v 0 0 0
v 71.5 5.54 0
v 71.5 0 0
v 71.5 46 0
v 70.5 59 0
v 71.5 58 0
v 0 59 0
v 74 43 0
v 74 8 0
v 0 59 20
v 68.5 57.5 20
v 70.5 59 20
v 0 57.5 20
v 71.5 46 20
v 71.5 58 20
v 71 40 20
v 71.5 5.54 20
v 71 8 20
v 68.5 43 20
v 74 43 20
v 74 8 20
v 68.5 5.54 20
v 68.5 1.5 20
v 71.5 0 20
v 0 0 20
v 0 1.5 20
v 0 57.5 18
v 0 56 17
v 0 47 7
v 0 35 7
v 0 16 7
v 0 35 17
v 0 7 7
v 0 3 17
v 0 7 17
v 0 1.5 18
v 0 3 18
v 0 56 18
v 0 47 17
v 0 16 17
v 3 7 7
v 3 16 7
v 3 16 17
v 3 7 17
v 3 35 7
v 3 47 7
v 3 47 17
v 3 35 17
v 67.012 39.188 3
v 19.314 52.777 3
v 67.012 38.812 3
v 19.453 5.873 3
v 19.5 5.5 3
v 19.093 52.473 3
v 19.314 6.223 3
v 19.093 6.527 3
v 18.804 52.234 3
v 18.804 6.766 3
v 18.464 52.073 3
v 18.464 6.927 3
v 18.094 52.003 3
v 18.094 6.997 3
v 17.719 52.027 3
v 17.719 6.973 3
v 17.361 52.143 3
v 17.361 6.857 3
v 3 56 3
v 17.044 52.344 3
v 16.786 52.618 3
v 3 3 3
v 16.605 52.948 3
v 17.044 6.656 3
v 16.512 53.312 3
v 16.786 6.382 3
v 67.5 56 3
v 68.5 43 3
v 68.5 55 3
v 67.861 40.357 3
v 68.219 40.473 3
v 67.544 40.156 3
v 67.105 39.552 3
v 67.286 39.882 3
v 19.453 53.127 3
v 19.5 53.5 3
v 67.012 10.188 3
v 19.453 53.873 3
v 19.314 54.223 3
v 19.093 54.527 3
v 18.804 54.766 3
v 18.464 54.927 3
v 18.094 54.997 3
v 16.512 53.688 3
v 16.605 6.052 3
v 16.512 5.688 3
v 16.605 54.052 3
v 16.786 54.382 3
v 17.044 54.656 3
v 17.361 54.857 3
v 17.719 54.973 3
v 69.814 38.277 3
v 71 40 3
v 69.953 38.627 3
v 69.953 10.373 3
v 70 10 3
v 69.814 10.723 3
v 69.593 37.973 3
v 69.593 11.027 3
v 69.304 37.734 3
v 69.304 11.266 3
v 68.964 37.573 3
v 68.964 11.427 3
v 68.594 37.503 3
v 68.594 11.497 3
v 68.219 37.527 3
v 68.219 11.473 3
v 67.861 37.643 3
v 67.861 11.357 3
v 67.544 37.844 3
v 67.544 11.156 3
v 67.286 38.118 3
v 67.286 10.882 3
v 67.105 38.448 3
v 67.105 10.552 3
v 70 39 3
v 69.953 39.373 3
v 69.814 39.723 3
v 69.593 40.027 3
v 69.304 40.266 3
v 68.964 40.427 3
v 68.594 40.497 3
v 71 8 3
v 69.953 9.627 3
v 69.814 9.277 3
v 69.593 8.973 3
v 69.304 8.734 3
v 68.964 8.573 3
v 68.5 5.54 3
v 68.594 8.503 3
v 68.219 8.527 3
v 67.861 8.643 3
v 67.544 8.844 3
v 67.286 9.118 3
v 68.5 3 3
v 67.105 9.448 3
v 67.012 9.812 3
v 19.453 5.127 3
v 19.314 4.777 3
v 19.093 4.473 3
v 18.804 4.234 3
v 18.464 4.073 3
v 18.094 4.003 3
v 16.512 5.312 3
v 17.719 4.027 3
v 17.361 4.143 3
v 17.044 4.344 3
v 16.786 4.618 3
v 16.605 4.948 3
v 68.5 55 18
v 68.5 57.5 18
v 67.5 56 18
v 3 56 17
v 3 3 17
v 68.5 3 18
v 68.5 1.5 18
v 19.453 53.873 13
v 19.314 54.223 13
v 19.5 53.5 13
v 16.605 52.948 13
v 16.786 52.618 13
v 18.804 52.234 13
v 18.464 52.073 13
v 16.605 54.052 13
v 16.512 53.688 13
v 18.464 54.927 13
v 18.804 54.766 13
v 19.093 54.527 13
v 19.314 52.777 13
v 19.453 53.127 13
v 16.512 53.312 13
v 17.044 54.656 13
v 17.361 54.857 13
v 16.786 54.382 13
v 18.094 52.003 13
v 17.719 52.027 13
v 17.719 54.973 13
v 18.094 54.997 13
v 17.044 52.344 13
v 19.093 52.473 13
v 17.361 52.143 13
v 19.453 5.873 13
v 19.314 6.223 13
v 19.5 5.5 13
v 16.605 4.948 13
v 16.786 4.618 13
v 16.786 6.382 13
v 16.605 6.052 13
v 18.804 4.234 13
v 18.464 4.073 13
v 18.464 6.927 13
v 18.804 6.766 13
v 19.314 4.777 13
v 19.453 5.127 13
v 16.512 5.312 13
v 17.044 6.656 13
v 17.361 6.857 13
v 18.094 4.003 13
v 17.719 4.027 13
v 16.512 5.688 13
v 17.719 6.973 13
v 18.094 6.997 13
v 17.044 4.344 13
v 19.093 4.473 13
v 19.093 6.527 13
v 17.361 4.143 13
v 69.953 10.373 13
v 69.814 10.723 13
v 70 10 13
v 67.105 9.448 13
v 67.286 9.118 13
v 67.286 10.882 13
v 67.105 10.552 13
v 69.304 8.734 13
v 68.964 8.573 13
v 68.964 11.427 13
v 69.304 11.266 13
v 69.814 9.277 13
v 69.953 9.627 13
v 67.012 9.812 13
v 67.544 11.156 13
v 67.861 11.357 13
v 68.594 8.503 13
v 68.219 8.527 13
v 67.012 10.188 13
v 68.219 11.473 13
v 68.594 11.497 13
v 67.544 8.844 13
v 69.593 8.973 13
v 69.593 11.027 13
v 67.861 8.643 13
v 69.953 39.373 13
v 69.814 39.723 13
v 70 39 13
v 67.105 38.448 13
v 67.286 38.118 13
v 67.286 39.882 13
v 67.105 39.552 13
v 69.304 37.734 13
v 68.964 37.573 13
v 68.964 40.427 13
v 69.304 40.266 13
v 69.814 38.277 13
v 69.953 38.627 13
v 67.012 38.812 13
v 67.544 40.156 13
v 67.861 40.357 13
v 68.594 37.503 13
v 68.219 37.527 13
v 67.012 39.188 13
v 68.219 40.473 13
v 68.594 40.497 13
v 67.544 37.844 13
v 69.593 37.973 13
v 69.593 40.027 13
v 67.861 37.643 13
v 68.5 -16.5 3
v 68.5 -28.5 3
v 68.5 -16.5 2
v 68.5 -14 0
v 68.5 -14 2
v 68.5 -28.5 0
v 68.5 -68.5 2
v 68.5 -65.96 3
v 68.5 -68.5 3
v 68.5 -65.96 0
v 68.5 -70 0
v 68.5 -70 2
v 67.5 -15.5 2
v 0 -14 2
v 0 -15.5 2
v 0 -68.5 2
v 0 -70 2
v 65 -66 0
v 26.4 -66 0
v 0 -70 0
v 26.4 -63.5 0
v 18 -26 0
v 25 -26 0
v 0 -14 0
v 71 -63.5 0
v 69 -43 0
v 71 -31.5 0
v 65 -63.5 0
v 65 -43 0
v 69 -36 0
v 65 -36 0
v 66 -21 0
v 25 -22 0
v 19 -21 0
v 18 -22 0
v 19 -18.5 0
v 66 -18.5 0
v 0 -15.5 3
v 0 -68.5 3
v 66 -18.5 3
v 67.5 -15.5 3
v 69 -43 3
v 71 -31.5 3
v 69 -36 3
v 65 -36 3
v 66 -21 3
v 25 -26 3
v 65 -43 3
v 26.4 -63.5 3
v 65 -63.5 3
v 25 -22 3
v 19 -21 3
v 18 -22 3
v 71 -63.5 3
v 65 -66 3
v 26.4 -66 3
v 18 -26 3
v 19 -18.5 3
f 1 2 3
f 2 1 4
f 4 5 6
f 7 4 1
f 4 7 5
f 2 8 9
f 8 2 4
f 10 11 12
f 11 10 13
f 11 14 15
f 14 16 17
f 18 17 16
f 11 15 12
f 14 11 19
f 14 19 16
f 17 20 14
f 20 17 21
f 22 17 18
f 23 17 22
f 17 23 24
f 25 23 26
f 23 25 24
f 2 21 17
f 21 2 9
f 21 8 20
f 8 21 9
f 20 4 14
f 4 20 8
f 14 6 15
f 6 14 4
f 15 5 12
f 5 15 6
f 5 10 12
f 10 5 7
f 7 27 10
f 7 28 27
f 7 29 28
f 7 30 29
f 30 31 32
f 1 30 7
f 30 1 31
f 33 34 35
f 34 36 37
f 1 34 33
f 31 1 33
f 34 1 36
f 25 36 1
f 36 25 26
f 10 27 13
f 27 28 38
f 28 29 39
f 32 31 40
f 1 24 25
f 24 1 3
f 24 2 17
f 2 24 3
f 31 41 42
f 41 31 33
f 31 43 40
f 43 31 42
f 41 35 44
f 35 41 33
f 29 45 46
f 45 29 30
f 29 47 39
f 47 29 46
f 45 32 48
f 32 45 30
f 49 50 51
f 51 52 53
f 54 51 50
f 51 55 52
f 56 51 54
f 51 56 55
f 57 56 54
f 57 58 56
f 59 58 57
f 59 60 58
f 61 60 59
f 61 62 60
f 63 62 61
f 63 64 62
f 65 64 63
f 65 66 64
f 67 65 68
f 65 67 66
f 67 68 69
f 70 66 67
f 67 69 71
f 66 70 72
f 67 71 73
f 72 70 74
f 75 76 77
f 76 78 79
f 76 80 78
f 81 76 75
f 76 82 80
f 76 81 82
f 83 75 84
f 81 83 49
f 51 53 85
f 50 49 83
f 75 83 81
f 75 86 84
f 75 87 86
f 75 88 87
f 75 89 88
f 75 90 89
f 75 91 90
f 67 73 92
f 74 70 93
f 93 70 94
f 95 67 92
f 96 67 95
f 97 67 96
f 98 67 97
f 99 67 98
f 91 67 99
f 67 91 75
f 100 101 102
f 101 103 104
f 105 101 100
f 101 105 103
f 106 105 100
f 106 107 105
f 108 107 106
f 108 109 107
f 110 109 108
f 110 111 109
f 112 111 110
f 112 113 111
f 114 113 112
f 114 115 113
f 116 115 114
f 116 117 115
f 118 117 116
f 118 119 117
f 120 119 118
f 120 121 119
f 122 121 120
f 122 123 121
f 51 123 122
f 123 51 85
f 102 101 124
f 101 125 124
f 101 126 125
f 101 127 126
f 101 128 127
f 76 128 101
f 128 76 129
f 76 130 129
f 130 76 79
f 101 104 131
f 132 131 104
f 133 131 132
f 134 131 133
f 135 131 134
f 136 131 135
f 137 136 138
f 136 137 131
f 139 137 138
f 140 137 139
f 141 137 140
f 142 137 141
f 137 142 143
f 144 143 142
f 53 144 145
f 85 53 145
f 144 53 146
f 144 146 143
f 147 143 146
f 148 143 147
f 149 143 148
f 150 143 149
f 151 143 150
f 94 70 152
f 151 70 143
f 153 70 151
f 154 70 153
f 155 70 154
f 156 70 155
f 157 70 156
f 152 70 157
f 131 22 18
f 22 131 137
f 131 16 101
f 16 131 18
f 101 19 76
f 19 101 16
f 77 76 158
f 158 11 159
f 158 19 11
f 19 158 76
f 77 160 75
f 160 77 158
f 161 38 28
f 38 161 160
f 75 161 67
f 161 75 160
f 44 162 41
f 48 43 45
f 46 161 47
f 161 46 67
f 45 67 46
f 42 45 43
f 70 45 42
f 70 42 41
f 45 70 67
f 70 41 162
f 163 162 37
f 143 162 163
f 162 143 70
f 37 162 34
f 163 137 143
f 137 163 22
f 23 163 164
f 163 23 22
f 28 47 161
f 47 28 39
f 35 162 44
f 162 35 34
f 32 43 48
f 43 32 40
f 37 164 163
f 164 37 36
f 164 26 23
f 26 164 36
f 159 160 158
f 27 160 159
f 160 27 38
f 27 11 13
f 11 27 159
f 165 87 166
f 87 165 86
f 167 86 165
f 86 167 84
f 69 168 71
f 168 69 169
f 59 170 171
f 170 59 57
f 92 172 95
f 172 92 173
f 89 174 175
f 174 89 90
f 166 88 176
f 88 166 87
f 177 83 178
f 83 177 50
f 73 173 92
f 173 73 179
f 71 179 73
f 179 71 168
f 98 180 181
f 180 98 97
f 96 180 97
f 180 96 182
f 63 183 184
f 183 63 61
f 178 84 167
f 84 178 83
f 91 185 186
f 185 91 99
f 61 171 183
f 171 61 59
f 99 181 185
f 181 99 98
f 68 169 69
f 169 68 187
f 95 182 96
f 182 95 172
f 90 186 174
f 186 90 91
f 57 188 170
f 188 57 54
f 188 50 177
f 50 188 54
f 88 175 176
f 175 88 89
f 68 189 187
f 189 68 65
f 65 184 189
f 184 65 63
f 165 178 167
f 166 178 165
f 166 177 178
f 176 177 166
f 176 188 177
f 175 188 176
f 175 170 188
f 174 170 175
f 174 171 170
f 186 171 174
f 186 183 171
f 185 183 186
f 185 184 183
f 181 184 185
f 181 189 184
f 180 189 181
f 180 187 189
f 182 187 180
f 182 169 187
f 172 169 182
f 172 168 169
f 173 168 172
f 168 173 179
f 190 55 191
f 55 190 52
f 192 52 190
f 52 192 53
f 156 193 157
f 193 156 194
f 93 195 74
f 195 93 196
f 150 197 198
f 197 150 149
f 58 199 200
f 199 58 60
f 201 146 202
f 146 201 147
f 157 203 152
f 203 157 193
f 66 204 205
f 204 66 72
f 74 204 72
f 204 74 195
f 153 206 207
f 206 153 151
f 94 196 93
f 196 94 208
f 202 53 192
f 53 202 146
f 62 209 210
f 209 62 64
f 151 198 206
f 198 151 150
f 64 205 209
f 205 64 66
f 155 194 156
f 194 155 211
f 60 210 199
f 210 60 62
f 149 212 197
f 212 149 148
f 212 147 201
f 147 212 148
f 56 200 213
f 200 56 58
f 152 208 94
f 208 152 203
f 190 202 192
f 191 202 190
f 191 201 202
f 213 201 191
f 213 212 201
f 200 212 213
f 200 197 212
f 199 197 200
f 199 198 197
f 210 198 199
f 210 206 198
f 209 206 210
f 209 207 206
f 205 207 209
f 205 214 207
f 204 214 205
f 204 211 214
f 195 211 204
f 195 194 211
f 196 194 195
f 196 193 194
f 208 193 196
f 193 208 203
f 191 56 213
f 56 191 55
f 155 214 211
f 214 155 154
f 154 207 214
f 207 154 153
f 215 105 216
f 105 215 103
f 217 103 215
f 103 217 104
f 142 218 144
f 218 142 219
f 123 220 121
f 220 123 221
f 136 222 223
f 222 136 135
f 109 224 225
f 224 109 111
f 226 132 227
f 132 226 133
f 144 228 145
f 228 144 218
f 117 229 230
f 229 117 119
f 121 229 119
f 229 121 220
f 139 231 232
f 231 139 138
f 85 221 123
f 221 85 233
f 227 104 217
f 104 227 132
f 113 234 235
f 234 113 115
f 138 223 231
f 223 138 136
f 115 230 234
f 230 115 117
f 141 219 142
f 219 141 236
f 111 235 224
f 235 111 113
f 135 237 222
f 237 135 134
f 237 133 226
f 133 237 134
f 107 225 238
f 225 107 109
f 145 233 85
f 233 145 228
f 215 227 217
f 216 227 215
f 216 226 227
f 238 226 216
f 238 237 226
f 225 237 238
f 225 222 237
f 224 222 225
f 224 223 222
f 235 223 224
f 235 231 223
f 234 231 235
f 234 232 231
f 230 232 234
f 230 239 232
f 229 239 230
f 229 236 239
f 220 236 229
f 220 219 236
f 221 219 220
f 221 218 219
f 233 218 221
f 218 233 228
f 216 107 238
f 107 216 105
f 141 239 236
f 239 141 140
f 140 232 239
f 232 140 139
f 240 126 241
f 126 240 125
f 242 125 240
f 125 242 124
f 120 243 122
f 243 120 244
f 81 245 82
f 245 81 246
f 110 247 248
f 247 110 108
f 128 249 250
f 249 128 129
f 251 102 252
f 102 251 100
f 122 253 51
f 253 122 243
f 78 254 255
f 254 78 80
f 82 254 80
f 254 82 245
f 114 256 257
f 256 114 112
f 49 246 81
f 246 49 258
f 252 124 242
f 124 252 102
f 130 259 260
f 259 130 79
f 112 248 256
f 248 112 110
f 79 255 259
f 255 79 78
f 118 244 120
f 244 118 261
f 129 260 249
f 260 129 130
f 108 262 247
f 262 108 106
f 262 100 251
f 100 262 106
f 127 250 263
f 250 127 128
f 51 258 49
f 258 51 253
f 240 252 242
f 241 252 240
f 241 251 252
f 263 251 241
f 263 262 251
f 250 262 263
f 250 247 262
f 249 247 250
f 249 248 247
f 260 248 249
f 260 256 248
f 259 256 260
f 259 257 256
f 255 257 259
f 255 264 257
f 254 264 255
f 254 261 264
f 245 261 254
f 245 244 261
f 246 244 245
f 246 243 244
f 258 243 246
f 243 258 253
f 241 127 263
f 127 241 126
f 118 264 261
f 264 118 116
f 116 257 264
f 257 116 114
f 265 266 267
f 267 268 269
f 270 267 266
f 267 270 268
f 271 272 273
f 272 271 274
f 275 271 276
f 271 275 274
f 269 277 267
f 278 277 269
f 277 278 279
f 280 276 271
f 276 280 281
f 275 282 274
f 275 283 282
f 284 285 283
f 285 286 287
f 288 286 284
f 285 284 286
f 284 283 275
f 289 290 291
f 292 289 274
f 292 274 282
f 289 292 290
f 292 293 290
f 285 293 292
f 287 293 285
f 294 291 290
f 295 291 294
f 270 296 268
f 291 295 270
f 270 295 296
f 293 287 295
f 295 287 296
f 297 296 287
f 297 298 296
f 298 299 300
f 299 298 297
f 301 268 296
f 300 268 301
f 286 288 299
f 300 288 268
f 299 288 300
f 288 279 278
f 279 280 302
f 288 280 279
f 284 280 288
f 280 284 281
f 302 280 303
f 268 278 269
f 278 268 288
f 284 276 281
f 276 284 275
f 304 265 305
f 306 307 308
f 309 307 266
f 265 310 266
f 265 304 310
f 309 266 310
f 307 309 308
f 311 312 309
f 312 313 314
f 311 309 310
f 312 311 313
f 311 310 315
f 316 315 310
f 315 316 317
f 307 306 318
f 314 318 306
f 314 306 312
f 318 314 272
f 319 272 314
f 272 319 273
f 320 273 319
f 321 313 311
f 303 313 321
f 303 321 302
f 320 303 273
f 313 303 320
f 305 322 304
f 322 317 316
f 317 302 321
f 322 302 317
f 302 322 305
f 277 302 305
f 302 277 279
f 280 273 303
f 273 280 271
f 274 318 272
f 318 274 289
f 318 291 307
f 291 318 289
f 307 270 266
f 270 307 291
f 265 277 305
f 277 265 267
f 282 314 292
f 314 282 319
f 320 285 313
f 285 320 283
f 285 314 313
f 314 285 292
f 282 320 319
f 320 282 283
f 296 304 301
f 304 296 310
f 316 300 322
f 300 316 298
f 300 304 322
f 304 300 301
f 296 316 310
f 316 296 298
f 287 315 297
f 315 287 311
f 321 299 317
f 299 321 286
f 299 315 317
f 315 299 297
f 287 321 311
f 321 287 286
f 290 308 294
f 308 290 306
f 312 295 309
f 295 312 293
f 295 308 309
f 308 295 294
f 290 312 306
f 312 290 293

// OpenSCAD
//This is the base case for arduino uno

board_width = 53;
board_thick = 4;
box_thick = 3;
// I create a 2D polygon using array points with exact same shape as the Arduino Uno Board, then use linear_extrude() function to make it 3D
module Box(box_height,box_thick)
{
	linear_extrude(height = box_height, convexity = 10, twist = 0)
	{
		polygon( points = [ [0, board_width+box_thick*2],
						[64.5+box_thick*2, board_width+box_thick*2],
						[65.5+box_thick*2, 52+box_thick*2],
						[65.5+box_thick*2, 40+box_thick*2],
						[68+box_thick*2, 37+box_thick*2],
						[68+box_thick*2, 5+box_thick],
						[65.5+box_thick*2, 2.54+box_thick],
						[65.5+box_thick*2, 0],
						[0, 0] ],
				convexity = 10);
	}
}
power_poz = 4;
module PowerPlug()
{
        translate([0,power_poz+box_thick,board_thick+box_thick])
		cube([24, 9, 11]);
}
USB_poz = 32;
module USB()
{
		translate([0, USB_poz+box_thick, board_thick+box_thick])
		cube([26, 12, 11]);
}
//Holes on Arduino Uno Board
module Hole()
{
	cylinder(r=1.5, h=13, $fn=25);
}
module lid()
{
    difference(){
        union(){
            cube([65.5+3,56,2]);
            translate([0,1.5,0])cube([10,53,3]);
            translate([68-65,1.5,0])Box(3,0);
        }
        #translate([24.4+2,4,0])cube([38.6,2.5,3]);
        #translate([17+2,53-4,0])cube([47,2.5,3]);
        #translate([18,53-7-2,0])cube([7,4,3]);
        #translate([63+2,25+2,0])cube([4,7,3]);
    }
}
// This is to make a box with plugins
union(){
    difference()
    {
        Box(20,3);
        PowerPlug();
        USB(); 
        box_thick = 0;
        #translate([3,3,3])Box(17,0);
        #translate([0,3,17])cube([3,59-2*3,3]); 
        #translate([0,1.5,18])cube([65.5+3,1.5,2]);
        #translate([0,1.5,18])cube([65.5+3,1.5,2]);
        #translate([0,1.5+53,18])cube([65.5+3,3,2]);
    }
    translate([15+3,53+3-1.5-1,0])Hole();
    translate([15+3,1.5+3+1,0])Hole();
    translate([65.5+3,7+3,0])Hole();
    translate([65.5+3,36+3,0])Hole();
}
// A lid for the box
translate([0,-70,0])lid();
